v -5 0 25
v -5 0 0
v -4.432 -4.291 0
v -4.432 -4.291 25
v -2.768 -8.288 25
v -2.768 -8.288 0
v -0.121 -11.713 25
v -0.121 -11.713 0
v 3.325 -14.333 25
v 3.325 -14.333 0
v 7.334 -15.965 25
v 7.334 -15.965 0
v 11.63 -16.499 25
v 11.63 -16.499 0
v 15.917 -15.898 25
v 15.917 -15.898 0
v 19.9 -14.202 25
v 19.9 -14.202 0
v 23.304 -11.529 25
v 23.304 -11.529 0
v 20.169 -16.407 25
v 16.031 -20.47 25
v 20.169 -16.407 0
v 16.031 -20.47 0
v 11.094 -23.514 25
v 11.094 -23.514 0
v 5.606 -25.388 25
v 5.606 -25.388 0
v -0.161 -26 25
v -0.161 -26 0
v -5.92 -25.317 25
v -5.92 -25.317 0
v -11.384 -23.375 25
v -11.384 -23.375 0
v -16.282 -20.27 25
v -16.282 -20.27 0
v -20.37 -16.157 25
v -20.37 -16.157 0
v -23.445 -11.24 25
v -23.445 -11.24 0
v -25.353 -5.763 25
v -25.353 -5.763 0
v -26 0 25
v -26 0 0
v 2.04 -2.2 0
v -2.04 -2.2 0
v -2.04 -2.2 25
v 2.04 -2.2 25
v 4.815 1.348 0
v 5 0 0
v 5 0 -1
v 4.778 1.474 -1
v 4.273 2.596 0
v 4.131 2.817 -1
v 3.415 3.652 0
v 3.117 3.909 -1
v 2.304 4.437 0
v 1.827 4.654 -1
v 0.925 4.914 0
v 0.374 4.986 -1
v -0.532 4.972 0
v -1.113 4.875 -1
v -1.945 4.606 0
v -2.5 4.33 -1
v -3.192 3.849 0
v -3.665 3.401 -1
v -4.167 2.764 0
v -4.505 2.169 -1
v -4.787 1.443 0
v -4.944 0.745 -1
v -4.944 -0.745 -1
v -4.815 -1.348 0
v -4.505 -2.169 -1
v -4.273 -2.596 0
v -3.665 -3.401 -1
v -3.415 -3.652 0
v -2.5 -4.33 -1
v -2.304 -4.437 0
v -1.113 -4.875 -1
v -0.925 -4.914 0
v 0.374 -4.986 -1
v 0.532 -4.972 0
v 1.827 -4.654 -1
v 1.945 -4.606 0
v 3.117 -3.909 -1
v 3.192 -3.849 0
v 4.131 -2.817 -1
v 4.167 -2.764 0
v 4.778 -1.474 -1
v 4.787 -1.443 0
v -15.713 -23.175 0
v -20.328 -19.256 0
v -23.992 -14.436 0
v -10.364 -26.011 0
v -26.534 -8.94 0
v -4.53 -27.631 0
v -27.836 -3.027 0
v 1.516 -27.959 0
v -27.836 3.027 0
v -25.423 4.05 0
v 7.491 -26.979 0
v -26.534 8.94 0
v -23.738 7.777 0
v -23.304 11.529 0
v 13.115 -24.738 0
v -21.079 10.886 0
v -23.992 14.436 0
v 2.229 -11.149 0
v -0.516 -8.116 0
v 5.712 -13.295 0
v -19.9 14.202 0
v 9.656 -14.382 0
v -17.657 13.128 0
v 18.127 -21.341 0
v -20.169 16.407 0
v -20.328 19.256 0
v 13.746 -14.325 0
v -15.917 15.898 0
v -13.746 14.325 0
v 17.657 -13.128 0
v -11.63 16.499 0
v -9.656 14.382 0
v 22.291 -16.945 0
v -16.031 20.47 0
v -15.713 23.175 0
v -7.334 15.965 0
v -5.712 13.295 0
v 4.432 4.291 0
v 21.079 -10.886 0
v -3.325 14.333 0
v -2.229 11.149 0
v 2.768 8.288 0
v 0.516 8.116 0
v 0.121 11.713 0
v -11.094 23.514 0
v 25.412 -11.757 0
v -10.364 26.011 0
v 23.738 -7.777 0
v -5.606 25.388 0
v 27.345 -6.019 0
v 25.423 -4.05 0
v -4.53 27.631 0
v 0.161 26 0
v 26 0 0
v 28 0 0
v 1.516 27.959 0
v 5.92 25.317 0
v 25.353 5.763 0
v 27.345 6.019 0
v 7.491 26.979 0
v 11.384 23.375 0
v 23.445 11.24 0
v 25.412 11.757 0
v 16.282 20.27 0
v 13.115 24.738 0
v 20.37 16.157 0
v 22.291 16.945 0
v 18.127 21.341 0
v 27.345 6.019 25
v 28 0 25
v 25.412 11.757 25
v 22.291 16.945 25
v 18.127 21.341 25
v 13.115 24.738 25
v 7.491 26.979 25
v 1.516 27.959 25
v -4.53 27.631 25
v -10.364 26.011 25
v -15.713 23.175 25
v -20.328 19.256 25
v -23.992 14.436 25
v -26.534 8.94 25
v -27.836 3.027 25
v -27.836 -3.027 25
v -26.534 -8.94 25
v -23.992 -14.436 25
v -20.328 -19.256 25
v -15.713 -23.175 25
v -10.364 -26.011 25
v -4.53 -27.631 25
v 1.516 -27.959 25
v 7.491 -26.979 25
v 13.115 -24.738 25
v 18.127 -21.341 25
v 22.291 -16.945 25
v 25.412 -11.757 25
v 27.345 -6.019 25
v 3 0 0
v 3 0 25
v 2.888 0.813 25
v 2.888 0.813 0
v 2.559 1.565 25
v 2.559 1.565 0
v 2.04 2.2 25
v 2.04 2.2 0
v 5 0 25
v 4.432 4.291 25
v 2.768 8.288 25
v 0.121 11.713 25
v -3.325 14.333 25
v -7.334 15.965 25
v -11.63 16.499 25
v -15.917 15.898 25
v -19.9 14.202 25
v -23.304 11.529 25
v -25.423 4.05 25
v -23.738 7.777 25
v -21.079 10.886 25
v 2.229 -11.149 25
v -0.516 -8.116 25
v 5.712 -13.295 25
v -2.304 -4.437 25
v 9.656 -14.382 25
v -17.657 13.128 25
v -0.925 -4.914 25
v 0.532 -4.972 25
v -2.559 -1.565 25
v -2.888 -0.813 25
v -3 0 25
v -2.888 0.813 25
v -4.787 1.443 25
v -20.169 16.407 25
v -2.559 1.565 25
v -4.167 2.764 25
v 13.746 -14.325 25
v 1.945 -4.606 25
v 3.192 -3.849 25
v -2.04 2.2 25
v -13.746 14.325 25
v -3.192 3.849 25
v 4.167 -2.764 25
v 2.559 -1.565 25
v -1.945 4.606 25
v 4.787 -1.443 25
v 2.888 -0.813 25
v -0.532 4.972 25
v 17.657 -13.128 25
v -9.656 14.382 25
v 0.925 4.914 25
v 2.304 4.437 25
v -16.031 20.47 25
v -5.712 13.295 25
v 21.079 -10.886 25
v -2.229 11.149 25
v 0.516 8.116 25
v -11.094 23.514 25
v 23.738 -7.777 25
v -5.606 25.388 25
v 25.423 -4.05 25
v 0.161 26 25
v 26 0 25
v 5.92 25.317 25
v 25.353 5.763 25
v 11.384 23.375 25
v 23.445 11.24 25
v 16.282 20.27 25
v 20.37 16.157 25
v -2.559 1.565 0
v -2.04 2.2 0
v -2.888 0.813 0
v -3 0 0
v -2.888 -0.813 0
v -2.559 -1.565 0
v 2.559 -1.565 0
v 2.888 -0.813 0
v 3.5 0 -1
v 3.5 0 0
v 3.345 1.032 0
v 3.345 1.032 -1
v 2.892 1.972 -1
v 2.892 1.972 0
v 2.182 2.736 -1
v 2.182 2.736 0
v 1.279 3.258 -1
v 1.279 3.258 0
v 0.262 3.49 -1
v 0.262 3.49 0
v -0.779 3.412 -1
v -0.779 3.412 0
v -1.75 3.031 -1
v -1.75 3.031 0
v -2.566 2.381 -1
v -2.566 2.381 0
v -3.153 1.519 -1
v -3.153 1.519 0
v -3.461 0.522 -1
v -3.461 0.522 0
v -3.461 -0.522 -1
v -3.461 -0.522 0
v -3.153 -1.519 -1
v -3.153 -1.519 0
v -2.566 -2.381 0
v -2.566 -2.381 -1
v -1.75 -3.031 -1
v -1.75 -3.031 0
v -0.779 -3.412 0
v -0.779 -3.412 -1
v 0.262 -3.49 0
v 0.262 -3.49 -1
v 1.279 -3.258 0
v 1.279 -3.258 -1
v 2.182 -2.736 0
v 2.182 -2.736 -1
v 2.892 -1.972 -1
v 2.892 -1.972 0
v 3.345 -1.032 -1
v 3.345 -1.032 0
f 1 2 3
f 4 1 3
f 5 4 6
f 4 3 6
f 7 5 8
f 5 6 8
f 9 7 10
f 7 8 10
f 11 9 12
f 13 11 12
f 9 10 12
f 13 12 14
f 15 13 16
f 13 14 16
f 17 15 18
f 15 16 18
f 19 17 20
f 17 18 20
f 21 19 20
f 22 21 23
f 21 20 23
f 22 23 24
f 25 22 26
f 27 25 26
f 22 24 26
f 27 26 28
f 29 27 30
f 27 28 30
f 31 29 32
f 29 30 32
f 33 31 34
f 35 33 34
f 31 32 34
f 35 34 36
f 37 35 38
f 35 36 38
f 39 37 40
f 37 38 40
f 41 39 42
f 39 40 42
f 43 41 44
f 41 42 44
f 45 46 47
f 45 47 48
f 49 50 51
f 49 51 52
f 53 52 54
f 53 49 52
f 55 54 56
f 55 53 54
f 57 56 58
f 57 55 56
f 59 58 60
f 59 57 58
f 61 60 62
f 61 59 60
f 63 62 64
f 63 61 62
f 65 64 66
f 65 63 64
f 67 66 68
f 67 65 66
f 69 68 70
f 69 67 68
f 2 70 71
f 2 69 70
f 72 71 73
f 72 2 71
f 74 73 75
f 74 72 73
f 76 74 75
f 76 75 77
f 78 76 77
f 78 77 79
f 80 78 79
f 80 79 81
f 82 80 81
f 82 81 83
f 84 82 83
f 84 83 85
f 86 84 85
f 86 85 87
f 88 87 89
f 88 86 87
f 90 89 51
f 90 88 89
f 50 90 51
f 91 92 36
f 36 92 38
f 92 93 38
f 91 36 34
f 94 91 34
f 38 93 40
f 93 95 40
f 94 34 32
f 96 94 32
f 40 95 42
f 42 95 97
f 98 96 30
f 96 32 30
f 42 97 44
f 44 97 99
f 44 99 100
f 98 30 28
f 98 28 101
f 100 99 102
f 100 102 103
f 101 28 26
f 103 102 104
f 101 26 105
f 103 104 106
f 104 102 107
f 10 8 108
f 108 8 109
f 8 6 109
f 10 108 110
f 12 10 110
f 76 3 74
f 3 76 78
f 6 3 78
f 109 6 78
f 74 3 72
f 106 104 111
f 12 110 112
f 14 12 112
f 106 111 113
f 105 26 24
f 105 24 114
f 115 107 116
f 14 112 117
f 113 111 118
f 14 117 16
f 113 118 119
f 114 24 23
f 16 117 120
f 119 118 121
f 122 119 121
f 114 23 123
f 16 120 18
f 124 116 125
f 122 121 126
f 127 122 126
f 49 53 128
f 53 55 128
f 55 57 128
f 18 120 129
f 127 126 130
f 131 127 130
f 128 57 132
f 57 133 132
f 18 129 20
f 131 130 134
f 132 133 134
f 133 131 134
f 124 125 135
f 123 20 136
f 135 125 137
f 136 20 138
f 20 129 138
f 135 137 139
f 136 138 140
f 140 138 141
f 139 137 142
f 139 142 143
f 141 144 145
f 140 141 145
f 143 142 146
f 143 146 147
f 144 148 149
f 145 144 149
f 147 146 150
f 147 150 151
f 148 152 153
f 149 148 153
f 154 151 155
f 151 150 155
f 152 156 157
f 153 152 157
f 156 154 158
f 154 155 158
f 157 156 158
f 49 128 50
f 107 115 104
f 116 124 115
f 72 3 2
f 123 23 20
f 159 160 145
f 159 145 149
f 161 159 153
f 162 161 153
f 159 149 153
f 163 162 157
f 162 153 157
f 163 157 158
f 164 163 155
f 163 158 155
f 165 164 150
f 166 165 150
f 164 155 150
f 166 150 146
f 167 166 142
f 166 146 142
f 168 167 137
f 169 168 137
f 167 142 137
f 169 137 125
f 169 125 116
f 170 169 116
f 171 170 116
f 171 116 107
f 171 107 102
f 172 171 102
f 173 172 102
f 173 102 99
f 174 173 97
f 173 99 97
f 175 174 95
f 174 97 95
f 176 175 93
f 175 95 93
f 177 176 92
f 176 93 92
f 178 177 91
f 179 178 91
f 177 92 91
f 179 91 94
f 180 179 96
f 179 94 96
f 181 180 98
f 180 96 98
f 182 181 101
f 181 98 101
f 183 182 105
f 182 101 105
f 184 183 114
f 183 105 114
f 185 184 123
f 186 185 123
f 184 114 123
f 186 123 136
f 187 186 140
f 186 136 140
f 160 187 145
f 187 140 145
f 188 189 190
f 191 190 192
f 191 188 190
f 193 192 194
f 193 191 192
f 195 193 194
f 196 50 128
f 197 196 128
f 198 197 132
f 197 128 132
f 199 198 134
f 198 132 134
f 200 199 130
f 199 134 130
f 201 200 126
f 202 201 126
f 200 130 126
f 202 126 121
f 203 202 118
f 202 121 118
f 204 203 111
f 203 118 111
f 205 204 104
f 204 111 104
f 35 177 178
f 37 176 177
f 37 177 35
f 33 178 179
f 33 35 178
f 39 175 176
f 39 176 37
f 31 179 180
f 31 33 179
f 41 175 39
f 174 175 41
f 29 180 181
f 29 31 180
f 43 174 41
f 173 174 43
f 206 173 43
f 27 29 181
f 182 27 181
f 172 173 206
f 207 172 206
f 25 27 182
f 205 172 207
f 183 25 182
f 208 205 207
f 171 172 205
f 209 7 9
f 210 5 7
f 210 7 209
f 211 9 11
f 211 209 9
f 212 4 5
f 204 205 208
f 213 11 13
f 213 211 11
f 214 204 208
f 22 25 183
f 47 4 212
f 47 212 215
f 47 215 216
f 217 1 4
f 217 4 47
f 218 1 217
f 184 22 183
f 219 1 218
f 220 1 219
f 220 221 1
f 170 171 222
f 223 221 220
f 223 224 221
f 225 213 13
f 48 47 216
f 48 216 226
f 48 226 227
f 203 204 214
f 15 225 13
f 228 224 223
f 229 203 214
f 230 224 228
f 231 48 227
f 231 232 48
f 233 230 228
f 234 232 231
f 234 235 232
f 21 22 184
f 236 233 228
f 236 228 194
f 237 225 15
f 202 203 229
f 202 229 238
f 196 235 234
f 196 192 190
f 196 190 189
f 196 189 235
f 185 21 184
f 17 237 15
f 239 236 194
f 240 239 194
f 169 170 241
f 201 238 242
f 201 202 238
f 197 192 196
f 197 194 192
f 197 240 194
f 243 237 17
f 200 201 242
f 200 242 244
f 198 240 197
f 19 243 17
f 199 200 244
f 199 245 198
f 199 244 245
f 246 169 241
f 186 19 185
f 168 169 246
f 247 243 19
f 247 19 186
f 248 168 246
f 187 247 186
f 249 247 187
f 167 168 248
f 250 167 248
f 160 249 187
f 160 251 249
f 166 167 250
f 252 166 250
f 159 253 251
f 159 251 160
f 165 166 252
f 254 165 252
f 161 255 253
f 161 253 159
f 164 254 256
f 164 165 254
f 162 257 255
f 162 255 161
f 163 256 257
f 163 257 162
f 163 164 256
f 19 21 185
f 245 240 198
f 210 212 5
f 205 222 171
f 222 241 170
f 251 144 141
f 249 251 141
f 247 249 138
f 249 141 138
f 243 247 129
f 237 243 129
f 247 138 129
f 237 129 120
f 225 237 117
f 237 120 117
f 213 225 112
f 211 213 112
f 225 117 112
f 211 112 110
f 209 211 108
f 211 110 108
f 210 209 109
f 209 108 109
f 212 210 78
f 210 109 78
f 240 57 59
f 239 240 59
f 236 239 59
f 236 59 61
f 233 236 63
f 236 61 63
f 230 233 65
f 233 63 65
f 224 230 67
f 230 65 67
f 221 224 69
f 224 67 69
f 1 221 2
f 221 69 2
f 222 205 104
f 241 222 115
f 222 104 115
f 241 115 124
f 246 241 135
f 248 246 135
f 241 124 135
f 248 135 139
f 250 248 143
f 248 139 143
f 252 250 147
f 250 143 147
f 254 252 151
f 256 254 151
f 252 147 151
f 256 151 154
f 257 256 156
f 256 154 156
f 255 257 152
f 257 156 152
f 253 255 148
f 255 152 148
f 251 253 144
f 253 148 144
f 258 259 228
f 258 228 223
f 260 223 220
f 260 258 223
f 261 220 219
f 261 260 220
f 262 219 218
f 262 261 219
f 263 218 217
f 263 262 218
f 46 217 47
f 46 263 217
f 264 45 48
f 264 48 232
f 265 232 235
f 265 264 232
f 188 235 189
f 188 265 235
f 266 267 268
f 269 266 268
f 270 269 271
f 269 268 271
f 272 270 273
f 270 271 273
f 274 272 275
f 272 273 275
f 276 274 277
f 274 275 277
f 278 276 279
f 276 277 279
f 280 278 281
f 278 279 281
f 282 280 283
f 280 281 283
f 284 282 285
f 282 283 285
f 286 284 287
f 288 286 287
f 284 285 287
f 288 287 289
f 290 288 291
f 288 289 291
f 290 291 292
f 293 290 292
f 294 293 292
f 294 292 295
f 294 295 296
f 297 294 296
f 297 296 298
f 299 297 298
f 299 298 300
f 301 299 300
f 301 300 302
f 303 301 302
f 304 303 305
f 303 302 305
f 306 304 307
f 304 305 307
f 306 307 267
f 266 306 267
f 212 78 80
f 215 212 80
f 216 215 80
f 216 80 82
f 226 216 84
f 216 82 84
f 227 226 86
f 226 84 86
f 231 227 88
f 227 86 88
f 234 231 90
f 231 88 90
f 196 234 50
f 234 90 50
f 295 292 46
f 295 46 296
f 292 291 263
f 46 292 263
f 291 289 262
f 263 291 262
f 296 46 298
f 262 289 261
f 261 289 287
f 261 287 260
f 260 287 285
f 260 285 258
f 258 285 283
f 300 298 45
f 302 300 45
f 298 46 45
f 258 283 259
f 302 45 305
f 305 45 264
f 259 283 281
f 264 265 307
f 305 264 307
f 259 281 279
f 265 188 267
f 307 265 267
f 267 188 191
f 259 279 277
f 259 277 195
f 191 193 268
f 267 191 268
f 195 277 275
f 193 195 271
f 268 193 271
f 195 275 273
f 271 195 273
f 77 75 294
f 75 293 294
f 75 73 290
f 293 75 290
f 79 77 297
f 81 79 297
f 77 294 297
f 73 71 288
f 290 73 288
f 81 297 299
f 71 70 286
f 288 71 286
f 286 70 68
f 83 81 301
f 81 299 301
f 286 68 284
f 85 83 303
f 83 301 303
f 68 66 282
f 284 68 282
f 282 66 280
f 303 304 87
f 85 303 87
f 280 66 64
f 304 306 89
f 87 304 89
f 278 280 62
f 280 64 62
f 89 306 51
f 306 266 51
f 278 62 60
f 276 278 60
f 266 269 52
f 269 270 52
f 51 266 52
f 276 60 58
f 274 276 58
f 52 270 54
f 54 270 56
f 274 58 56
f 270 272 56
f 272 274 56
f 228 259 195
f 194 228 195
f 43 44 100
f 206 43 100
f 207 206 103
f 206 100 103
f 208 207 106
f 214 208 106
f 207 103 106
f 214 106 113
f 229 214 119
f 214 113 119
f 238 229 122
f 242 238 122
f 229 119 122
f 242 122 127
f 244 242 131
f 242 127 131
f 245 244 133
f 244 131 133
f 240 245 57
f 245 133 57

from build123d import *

# Parameters (mm, degrees)
F0_R     = 28
F1_DEPTH = 25
F2_W     = 4.079216
F2_H     = 4.4
F3_DEPTH = 30
F4_R     = 5
F4_R_2   = 3.5
F5_DEPTH = 1


with BuildPart() as f1:
    # F0 (on Top) → F1 (new body)
    with BuildSketch(Plane.XY):
        Circle(F0_R)
        with BuildLine():
            ThreePointArc((23.304348, -11.528546), (-5.919753, -25.317119), (-26, 0))
            ThreePointArc((-26, 0), (-13.745769, 14.325031), (2.304348, 4.437339))
            ThreePointArc((2.304348, 4.437339), (-2.595984, 4.273274), (-5, 0))
            ThreePointArc((-5, 0), (5.275923, -15.281062), (23.304348, -11.528546))
        make_face(mode=Mode.SUBTRACT)
        with BuildLine():
            ThreePointArc((-2.304348, -4.437339), (2.595984, -4.273274), (5, 0))
            ThreePointArc((5, 0), (-5.275923, 15.281062), (-23.304348, 11.528546))
            ThreePointArc((-23.304348, 11.528546), (5.919753, 25.317119), (26, 0))
            ThreePointArc((26, 0), (13.745769, -14.325031), (-2.304348, -4.437339))
        make_face(mode=Mode.SUBTRACT)
    extrude(amount=F1_DEPTH)

    # F2 (on Top) → F3 (cut)
    with BuildSketch(Plane.XY):
        with BuildLine():
            Line((-2.039608, -2.2), (-2.039608, 2.2))
            ThreePointArc((-2.039608, 2.2), (-3, 0), (-2.039608, -2.2))
        make_face()
        Rectangle(F2_W, F2_H)
        with BuildLine():
            ThreePointArc((2.039608, -2.2), (2.749438, -1.200245), (3, 0))
            ThreePointArc((3, 0), (2.749438, 1.200245), (2.039608, 2.2))
            Line((2.039608, 2.2), (2.039608, -2.2))
        make_face()
    extrude(amount=F3_DEPTH, mode=Mode.SUBTRACT)

    # F4 (on Top) → F5 (join)
    with BuildSketch(Plane.XY):
        Circle(F4_R)
        Circle(F4_R_2, mode=Mode.SUBTRACT)
    extrude(amount=-F5_DEPTH)


solid = f1.part
